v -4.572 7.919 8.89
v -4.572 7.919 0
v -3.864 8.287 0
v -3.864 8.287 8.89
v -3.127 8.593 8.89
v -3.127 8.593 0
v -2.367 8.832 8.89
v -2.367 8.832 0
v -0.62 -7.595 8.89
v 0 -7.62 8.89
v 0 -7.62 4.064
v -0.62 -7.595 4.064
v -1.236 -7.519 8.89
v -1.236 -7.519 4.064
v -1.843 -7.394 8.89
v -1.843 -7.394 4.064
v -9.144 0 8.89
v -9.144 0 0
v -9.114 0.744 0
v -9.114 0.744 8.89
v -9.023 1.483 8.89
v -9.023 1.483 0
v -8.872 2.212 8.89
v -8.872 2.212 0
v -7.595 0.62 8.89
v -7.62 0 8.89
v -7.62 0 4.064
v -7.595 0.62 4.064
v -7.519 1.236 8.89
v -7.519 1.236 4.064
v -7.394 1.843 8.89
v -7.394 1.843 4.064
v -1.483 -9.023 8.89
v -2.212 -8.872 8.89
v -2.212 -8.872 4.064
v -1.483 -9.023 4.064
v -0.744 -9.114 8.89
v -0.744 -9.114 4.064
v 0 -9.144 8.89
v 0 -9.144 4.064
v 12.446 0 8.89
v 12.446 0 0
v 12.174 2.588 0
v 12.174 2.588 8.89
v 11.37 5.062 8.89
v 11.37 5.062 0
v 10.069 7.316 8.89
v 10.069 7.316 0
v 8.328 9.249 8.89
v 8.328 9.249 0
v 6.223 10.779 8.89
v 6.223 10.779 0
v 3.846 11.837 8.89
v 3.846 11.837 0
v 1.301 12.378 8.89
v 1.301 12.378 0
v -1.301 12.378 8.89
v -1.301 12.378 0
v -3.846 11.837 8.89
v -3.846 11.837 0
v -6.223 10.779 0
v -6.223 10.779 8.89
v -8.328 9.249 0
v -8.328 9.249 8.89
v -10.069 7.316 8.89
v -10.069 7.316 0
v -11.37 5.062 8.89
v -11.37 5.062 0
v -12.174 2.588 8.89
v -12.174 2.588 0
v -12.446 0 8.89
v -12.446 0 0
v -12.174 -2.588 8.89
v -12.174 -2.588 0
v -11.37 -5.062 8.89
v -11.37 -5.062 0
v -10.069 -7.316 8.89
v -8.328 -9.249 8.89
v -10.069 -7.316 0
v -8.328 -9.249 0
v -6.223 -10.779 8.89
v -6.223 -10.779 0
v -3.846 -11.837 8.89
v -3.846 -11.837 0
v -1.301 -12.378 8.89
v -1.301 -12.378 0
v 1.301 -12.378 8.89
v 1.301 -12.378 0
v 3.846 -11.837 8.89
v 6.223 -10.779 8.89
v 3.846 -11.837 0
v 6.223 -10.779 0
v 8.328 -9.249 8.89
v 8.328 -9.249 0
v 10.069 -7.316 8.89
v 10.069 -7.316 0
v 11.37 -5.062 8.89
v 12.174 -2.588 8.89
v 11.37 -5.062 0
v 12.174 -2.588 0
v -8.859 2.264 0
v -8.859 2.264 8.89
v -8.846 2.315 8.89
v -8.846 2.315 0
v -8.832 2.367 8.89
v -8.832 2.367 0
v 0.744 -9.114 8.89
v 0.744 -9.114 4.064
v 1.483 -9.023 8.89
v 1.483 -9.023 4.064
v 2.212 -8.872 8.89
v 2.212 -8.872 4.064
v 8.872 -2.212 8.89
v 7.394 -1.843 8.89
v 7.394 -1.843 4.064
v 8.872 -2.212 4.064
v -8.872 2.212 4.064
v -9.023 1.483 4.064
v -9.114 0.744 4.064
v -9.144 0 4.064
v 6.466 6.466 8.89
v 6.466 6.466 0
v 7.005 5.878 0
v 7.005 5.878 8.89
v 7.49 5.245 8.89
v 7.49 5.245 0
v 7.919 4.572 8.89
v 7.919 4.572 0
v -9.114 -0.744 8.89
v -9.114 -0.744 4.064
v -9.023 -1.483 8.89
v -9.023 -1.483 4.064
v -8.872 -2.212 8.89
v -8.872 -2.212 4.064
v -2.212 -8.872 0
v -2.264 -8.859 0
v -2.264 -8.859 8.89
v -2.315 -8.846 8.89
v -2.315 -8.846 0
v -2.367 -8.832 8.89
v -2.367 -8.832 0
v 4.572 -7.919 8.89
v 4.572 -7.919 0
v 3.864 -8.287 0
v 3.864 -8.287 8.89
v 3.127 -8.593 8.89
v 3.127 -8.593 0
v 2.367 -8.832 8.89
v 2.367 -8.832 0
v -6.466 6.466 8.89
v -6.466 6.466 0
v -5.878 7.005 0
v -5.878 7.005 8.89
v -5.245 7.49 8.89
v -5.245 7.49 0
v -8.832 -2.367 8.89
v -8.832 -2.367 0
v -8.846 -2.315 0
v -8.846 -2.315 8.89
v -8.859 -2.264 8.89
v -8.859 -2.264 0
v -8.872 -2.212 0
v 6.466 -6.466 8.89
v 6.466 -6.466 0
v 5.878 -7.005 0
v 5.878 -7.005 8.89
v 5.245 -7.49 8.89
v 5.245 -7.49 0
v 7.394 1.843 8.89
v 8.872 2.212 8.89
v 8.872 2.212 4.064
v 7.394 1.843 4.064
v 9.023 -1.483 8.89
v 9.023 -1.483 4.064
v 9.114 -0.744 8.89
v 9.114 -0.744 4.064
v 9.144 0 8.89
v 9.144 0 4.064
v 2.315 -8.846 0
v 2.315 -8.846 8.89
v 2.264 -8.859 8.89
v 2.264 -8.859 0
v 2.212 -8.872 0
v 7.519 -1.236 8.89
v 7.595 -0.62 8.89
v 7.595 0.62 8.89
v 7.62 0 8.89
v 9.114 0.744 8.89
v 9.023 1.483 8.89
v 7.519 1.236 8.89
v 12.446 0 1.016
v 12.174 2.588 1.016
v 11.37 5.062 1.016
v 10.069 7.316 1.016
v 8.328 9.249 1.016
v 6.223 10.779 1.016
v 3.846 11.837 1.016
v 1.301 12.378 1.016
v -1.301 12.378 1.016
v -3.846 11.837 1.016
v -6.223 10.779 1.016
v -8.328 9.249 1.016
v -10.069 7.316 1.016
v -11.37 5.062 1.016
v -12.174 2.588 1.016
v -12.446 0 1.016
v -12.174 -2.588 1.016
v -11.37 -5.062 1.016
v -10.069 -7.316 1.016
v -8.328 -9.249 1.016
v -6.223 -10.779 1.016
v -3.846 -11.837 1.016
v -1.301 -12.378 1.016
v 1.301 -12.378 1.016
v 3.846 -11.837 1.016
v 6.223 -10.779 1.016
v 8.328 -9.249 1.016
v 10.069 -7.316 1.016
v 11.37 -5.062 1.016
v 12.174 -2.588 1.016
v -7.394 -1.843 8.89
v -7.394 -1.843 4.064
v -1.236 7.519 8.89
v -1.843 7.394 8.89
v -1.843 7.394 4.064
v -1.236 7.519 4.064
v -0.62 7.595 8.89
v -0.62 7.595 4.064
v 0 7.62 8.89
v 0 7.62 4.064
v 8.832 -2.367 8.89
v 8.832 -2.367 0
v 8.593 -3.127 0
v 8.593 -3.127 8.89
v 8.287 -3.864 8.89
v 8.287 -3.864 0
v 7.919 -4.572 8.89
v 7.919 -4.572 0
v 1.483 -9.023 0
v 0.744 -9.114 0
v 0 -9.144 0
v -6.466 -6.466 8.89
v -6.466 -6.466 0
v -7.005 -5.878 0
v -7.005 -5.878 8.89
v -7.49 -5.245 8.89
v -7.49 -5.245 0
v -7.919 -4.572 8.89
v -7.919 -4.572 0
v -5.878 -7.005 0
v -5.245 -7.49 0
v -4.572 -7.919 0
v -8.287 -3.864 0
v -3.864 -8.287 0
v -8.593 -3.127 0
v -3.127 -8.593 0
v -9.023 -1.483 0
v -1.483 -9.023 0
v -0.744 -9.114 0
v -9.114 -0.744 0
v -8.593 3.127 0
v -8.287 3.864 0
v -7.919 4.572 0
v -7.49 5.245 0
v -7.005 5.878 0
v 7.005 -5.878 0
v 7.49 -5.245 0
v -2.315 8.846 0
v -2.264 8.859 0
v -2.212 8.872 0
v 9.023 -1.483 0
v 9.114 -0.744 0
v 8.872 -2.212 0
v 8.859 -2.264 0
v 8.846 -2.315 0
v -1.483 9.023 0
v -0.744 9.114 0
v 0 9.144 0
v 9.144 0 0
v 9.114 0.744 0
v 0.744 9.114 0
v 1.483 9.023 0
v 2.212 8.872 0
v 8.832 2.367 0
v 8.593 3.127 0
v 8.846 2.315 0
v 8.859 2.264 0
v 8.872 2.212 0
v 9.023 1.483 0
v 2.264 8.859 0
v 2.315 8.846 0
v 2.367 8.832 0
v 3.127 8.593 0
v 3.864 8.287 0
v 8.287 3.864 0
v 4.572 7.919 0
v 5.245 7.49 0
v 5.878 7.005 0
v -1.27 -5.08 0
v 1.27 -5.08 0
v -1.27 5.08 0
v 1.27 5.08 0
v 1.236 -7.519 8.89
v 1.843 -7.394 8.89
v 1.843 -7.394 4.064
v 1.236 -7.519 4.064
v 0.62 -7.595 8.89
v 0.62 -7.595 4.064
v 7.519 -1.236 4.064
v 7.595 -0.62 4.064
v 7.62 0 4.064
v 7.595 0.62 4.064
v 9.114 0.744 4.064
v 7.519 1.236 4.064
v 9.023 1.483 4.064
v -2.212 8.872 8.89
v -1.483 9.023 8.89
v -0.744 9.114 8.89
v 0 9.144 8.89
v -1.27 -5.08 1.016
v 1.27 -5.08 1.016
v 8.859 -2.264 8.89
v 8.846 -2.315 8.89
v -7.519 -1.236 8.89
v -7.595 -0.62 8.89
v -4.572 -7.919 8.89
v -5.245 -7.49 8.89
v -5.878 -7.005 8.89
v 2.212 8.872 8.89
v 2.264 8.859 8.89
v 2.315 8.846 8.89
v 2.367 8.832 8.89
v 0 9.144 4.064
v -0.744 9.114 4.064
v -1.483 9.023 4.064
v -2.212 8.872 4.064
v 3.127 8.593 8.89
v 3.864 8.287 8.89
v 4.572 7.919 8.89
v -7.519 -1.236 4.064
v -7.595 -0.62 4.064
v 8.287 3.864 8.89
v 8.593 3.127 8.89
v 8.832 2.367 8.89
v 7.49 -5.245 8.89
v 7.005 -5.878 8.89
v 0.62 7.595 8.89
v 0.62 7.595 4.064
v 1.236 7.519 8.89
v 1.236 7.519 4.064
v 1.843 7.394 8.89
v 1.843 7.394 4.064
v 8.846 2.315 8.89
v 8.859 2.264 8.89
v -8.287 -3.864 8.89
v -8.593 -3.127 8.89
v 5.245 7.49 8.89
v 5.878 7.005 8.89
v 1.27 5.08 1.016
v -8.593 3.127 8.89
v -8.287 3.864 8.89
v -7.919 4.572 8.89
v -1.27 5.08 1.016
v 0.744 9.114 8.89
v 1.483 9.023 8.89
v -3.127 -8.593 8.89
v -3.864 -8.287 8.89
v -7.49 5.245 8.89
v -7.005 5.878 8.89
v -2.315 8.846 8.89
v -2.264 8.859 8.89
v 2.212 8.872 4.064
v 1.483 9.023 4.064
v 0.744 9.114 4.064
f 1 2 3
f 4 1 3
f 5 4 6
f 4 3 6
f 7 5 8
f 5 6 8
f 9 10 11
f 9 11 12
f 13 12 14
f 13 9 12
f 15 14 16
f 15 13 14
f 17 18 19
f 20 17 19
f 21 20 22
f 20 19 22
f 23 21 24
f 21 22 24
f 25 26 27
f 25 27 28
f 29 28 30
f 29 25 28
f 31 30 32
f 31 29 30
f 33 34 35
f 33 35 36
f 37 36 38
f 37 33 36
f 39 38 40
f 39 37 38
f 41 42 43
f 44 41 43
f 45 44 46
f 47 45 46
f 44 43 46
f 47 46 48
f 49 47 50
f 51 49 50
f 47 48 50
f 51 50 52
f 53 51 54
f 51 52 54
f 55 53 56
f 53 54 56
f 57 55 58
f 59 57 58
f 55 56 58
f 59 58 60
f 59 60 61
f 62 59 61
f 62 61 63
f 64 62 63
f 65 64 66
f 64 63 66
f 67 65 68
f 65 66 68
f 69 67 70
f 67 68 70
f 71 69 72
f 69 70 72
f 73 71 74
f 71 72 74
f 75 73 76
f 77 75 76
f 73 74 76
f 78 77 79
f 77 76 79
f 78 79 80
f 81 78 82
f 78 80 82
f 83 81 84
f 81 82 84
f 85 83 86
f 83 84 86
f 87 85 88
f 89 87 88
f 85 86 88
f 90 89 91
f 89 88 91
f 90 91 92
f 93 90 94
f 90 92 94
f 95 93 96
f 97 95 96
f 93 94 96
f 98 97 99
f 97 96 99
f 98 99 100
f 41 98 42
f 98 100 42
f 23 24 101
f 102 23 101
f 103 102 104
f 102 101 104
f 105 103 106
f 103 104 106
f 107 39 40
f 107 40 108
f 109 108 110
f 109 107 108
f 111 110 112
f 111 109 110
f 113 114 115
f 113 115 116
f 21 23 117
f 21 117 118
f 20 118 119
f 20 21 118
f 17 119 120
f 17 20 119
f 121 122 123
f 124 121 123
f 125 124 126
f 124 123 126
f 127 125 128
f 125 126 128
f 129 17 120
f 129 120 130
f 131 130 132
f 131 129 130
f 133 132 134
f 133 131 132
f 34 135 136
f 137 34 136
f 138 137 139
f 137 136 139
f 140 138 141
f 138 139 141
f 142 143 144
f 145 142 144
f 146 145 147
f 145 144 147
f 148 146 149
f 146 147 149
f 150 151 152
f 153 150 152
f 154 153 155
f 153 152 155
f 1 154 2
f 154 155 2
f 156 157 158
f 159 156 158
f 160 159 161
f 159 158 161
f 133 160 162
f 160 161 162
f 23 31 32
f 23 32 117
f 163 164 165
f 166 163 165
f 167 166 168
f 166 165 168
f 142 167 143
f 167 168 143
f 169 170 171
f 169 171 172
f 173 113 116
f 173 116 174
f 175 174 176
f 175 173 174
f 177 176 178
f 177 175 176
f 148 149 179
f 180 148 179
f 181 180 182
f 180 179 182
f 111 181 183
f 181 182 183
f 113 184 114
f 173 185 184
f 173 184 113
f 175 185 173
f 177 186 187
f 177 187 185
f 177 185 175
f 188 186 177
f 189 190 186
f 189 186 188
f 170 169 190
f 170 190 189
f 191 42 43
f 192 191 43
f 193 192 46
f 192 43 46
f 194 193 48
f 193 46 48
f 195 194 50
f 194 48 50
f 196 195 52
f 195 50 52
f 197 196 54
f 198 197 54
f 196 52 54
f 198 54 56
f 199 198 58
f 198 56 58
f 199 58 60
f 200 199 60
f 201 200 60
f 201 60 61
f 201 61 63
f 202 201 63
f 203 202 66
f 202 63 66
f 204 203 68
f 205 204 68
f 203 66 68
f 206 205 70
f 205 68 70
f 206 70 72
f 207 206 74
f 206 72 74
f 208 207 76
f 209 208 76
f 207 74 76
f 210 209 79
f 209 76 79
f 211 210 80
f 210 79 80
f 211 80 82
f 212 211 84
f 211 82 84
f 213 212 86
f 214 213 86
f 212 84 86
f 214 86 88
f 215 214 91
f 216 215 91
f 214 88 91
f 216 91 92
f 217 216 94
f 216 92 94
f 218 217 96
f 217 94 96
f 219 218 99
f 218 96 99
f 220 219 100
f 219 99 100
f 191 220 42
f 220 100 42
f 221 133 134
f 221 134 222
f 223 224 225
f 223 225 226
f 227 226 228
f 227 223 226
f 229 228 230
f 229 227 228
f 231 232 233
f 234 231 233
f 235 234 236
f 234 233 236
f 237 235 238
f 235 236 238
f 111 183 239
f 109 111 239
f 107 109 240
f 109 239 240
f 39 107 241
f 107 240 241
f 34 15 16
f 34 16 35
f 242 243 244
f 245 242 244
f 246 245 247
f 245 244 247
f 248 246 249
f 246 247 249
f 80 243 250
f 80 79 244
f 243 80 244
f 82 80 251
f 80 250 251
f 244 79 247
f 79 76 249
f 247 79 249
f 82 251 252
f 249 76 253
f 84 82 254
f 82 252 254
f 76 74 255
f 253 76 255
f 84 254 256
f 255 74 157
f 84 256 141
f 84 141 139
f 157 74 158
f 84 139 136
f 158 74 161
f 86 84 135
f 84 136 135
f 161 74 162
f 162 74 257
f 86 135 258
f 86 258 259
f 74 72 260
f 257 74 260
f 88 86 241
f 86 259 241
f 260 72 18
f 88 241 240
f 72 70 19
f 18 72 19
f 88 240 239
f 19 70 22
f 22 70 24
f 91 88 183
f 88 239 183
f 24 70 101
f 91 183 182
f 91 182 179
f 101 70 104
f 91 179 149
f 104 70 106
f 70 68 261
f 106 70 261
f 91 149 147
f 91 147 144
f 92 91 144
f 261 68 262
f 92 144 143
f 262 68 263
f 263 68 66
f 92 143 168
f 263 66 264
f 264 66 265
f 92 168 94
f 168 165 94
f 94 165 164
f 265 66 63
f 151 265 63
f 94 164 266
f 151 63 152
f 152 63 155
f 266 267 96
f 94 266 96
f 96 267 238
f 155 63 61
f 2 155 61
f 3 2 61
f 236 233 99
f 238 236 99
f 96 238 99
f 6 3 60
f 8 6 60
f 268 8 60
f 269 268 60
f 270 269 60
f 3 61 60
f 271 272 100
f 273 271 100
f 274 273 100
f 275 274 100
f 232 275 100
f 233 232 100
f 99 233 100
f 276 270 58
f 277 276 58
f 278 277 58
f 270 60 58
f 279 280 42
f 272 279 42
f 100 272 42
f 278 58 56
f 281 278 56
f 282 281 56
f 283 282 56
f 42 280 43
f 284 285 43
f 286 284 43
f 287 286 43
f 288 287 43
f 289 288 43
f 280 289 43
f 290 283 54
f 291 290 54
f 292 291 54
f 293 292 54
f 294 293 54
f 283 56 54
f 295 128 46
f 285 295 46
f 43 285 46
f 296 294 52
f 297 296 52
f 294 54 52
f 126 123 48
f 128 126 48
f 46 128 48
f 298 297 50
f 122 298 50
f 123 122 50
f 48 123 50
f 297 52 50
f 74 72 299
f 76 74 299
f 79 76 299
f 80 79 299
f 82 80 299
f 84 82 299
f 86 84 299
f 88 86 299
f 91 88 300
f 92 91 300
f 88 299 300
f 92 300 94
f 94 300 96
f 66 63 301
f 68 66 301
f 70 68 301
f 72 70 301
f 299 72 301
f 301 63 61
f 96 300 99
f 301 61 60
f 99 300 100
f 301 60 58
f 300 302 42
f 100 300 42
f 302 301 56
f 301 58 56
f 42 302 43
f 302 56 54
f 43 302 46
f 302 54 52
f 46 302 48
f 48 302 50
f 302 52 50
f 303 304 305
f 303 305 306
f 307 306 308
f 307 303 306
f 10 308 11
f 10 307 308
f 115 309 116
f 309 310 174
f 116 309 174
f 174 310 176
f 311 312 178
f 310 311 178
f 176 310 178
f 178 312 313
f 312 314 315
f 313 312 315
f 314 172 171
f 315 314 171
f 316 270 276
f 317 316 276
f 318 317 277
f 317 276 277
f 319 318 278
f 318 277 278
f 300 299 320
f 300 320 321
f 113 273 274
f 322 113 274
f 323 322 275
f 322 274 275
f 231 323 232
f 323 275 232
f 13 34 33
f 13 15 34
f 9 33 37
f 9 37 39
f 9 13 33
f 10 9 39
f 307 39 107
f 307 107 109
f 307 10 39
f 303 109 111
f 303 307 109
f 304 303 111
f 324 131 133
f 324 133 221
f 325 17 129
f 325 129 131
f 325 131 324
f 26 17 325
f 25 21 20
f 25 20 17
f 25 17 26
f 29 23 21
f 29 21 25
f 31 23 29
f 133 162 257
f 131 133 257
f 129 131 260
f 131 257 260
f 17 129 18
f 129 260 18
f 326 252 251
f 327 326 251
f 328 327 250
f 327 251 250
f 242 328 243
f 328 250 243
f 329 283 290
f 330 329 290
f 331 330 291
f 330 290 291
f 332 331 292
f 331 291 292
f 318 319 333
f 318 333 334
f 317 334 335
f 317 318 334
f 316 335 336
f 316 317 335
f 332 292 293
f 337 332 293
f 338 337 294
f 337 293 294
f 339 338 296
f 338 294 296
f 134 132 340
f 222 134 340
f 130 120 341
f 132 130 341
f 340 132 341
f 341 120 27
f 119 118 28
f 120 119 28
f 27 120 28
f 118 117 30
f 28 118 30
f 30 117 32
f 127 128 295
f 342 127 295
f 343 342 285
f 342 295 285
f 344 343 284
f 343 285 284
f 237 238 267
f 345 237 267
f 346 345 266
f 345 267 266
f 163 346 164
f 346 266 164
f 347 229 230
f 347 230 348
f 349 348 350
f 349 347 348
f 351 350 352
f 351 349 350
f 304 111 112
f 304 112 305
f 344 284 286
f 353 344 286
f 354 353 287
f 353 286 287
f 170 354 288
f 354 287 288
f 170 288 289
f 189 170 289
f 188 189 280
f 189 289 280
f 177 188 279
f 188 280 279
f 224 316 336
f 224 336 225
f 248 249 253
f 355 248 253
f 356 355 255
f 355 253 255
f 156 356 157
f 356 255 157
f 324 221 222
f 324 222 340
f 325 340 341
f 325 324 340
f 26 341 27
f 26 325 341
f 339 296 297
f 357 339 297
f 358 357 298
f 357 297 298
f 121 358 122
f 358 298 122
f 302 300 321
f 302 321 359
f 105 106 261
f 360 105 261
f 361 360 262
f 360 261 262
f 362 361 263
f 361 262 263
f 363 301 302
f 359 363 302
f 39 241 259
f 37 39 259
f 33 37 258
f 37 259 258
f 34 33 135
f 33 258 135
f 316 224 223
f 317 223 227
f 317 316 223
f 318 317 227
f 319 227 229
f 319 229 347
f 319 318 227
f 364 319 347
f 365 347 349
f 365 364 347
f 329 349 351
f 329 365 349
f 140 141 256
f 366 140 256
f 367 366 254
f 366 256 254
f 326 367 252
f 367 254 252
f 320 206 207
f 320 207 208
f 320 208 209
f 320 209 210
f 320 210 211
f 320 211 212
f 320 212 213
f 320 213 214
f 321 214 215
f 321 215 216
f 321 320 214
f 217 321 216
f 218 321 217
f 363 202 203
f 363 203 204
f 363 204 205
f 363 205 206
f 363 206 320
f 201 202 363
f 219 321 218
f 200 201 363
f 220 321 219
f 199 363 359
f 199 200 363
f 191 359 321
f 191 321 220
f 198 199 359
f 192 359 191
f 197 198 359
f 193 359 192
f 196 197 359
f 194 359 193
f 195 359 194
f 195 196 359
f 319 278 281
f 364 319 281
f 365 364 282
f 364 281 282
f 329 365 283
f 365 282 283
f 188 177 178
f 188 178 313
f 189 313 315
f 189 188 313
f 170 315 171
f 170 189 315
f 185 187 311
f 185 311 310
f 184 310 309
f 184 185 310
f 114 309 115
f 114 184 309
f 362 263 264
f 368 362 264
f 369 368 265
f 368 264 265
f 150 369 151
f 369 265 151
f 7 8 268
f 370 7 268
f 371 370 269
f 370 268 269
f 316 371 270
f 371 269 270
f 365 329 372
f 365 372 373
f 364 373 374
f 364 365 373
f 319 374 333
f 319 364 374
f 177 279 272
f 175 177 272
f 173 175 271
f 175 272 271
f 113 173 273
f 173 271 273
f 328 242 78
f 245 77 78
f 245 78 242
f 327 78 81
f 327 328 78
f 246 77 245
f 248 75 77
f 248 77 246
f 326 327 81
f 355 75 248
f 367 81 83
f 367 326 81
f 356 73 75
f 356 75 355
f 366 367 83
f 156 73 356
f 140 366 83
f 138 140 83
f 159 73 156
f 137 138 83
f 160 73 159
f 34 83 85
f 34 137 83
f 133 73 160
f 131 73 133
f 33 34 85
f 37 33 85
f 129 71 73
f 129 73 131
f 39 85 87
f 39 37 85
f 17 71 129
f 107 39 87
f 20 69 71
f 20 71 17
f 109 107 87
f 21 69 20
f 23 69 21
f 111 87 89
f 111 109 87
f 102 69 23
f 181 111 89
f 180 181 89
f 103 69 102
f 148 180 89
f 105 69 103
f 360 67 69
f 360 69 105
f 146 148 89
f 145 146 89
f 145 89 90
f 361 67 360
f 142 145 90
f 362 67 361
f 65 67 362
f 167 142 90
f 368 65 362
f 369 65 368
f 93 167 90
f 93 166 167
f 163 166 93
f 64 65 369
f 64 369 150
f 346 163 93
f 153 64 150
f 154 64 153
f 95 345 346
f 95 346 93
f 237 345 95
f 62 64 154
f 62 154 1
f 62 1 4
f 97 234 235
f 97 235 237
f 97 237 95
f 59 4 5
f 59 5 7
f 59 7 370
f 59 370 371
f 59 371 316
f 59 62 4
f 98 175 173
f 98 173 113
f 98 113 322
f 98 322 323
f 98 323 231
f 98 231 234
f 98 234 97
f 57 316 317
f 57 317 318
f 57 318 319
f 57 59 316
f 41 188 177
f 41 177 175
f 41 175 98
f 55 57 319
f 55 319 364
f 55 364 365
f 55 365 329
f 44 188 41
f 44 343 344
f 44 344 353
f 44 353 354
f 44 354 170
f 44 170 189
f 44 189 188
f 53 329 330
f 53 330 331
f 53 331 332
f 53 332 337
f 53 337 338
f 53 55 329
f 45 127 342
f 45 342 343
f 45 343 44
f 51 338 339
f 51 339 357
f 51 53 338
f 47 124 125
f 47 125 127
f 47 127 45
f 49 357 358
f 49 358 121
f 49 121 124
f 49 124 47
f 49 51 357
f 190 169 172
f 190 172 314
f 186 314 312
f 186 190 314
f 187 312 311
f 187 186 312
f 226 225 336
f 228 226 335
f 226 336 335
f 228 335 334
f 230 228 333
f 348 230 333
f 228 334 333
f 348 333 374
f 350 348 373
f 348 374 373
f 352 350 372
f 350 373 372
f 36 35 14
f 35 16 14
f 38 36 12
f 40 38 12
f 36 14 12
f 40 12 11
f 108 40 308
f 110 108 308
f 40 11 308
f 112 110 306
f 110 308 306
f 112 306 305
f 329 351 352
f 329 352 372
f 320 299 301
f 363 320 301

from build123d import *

# Parameters (mm, degrees)
F0_R     = 12.446
F1_DEPTH = 8.89
F3_DEPTH = 4.826
F4_R     = 12.446
F5_DEPTH = 1.016
F6_W     = 2.54
F6_H     = 10.16
F7_DEPTH = 2.54


with BuildPart() as f1:
    # F0 (on Top) → F1 (new body)
    with BuildSketch(Plane.XY):
        Circle(F0_R)
        with BuildLine():
            ThreePointArc((8.872384, 2.212134), (9.075842, 1.114373), (9.144, 0))
            ThreePointArc((9.144, 0), (9.075842, -1.114373), (8.872384, -2.212134))
            ThreePointArc((8.872384, -2.212134), (8.852742, -2.289475), (8.832426, -2.366641))
            ThreePointArc((8.832426, -2.366641), (8.447954, -3.499257), (7.918936, -4.572))
            ThreePointArc((7.918936, -4.572), (7.254423, -5.566515), (6.465784, -6.465784))
            ThreePointArc((6.465784, -6.465784), (5.566515, -7.254423), (4.572, -7.918936))
            ThreePointArc((4.572, -7.918936), (3.499257, -8.447954), (2.366641, -8.832426))
            ThreePointArc((2.366641, -8.832426), (2.289475, -8.852742), (2.212134, -8.872384))
            ThreePointArc((2.212134, -8.872384), (1.114373, -9.075842), (0, -9.144))
            ThreePointArc((0, -9.144), (-1.114373, -9.075842), (-2.212134, -8.872384))
            ThreePointArc((-2.212134, -8.872384), (-2.289475, -8.852742), (-2.366641, -8.832426))
            ThreePointArc((-2.366641, -8.832426), (-3.499257, -8.447954), (-4.572, -7.918936))
            ThreePointArc((-4.572, -7.918936), (-5.566515, -7.254423), (-6.465784, -6.465784))
            ThreePointArc((-6.465784, -6.465784), (-7.254423, -5.566515), (-7.918936, -4.572))
            ThreePointArc((-7.918936, -4.572), (-8.447954, -3.499257), (-8.832426, -2.366641))
            ThreePointArc((-8.832426, -2.366641), (-8.852742, -2.289475), (-8.872384, -2.212134))
            ThreePointArc((-8.872384, -2.212134), (-9.075842, -1.114373), (-9.144, 0))
            ThreePointArc((-9.144, 0), (-9.075842, 1.114373), (-8.872384, 2.212134))
            ThreePointArc((-8.872384, 2.212134), (-8.852742, 2.289475), (-8.832426, 2.366641))
            ThreePointArc((-8.832426, 2.366641), (-8.447954, 3.499257), (-7.918936, 4.572))
            ThreePointArc((-7.918936, 4.572), (-7.254423, 5.566515), (-6.465784, 6.465784))
            ThreePointArc((-6.465784, 6.465784), (-5.566515, 7.254423), (-4.572, 7.918936))
            ThreePointArc((-4.572, 7.918936), (-3.499257, 8.447954), (-2.366641, 8.832426))
            ThreePointArc((-2.366641, 8.832426), (-2.289475, 8.852742), (-2.212134, 8.872384))
            ThreePointArc((-2.212134, 8.872384), (-1.114373, 9.075842), (0, 9.144))
            ThreePointArc((0, 9.144), (1.114373, 9.075842), (2.212134, 8.872384))
            ThreePointArc((2.212134, 8.872384), (2.289475, 8.852742), (2.366641, 8.832426))
            ThreePointArc((2.366641, 8.832426), (3.499257, 8.447954), (4.572, 7.918936))
            ThreePointArc((4.572, 7.918936), (5.566515, 7.254423), (6.465784, 6.465784))
            ThreePointArc((6.465784, 6.465784), (7.254423, 5.566515), (7.918936, 4.572))
            ThreePointArc((7.918936, 4.572), (8.447954, 3.499257), (8.832426, 2.366641))
            ThreePointArc((8.832426, 2.366641), (8.852742, 2.289475), (8.872384, 2.212134))
        make_face(mode=Mode.SUBTRACT)
    extrude(amount=F1_DEPTH)


with BuildPart() as f3:
    # F2 (on face) → F3 (new body)
    with BuildSketch(Plane.XY.offset(8.89)):
        with BuildLine():
            ThreePointArc((-8.872384, 2.212134), (-9.075842, 1.114373), (-9.144, 0))
            Line((-9.144, 0), (-7.62, 0))
            ThreePointArc((-7.62, 0), (-7.563202, 0.928644), (-7.393653, 1.843445))
            Line((-7.393653, 1.843445), (-8.872384, 2.212134))
        make_face()
        with BuildLine():
            Line((-7.62, 0), (-9.144, 0))
            ThreePointArc((-9.144, 0), (-9.075842, -1.114373), (-8.872384, -2.212134))
            Line((-8.872384, -2.212134), (-7.393653, -1.843445))
            ThreePointArc((-7.393653, -1.843445), (-7.563202, -0.928644), (-7.62, 0))
        make_face()
        with BuildLine():
            ThreePointArc((-2.212134, -8.872384), (-1.114373, -9.075842), (0, -9.144))
            Line((0, -9.144), (0, -7.62))
            ThreePointArc((0, -7.62), (-0.928644, -7.563202), (-1.843445, -7.393653))
            Line((-1.843445, -7.393653), (-2.212134, -8.872384))
        make_face()
        with BuildLine():
            Line((0, -7.62), (0, -9.144))
            ThreePointArc((0, -9.144), (1.114373, -9.075842), (2.212134, -8.872384))
            Line((2.212134, -8.872384), (1.843445, -7.393653))
            ThreePointArc((1.843445, -7.393653), (0.928644, -7.563202), (0, -7.62))
        make_face()
        with BuildLine():
            ThreePointArc((8.872384, -2.212134), (9.075842, -1.114373), (9.144, 0))
            Line((9.144, 0), (7.62, 0))
            ThreePointArc((7.62, 0), (7.563202, -0.928644), (7.393653, -1.843445))
            Line((7.393653, -1.843445), (8.872384, -2.212134))
        make_face()
        with BuildLine():
            Line((7.62, 0), (9.144, 0))
            ThreePointArc((9.144, 0), (9.075842, 1.114373), (8.872384, 2.212134))
            Line((8.872384, 2.212134), (7.393653, 1.843445))
            ThreePointArc((7.393653, 1.843445), (7.563202, 0.928644), (7.62, 0))
        make_face()
        with BuildLine():
            ThreePointArc((2.212134, 8.872384), (1.114373, 9.075842), (0, 9.144))
            Line((0, 9.144), (0, 7.62))
            ThreePointArc((0, 7.62), (0.928644, 7.563202), (1.843445, 7.393653))
            Line((1.843445, 7.393653), (2.212134, 8.872384))
        make_face()
        with BuildLine():
            Line((0, 7.62), (0, 9.144))
            ThreePointArc((0, 9.144), (-1.114373, 9.075842), (-2.212134, 8.872384))
            Line((-2.212134, 8.872384), (-1.843445, 7.393653))
            ThreePointArc((-1.843445, 7.393653), (-0.928644, 7.563202), (0, 7.62))
        make_face()
    extrude(amount=-F3_DEPTH)


with BuildPart() as f5:
    # F4 (on face) → F5 (new body)
    with BuildSketch(Plane.XY):
        Circle(F4_R)
    extrude(amount=F5_DEPTH)

    # F6 (on face) → F7 (cut)
    with BuildSketch(Plane.XY):
        Rectangle(F6_W, F6_H)
    extrude(amount=F7_DEPTH, mode=Mode.SUBTRACT)


solid = Compound([f1.part, f3.part, f5.part])
